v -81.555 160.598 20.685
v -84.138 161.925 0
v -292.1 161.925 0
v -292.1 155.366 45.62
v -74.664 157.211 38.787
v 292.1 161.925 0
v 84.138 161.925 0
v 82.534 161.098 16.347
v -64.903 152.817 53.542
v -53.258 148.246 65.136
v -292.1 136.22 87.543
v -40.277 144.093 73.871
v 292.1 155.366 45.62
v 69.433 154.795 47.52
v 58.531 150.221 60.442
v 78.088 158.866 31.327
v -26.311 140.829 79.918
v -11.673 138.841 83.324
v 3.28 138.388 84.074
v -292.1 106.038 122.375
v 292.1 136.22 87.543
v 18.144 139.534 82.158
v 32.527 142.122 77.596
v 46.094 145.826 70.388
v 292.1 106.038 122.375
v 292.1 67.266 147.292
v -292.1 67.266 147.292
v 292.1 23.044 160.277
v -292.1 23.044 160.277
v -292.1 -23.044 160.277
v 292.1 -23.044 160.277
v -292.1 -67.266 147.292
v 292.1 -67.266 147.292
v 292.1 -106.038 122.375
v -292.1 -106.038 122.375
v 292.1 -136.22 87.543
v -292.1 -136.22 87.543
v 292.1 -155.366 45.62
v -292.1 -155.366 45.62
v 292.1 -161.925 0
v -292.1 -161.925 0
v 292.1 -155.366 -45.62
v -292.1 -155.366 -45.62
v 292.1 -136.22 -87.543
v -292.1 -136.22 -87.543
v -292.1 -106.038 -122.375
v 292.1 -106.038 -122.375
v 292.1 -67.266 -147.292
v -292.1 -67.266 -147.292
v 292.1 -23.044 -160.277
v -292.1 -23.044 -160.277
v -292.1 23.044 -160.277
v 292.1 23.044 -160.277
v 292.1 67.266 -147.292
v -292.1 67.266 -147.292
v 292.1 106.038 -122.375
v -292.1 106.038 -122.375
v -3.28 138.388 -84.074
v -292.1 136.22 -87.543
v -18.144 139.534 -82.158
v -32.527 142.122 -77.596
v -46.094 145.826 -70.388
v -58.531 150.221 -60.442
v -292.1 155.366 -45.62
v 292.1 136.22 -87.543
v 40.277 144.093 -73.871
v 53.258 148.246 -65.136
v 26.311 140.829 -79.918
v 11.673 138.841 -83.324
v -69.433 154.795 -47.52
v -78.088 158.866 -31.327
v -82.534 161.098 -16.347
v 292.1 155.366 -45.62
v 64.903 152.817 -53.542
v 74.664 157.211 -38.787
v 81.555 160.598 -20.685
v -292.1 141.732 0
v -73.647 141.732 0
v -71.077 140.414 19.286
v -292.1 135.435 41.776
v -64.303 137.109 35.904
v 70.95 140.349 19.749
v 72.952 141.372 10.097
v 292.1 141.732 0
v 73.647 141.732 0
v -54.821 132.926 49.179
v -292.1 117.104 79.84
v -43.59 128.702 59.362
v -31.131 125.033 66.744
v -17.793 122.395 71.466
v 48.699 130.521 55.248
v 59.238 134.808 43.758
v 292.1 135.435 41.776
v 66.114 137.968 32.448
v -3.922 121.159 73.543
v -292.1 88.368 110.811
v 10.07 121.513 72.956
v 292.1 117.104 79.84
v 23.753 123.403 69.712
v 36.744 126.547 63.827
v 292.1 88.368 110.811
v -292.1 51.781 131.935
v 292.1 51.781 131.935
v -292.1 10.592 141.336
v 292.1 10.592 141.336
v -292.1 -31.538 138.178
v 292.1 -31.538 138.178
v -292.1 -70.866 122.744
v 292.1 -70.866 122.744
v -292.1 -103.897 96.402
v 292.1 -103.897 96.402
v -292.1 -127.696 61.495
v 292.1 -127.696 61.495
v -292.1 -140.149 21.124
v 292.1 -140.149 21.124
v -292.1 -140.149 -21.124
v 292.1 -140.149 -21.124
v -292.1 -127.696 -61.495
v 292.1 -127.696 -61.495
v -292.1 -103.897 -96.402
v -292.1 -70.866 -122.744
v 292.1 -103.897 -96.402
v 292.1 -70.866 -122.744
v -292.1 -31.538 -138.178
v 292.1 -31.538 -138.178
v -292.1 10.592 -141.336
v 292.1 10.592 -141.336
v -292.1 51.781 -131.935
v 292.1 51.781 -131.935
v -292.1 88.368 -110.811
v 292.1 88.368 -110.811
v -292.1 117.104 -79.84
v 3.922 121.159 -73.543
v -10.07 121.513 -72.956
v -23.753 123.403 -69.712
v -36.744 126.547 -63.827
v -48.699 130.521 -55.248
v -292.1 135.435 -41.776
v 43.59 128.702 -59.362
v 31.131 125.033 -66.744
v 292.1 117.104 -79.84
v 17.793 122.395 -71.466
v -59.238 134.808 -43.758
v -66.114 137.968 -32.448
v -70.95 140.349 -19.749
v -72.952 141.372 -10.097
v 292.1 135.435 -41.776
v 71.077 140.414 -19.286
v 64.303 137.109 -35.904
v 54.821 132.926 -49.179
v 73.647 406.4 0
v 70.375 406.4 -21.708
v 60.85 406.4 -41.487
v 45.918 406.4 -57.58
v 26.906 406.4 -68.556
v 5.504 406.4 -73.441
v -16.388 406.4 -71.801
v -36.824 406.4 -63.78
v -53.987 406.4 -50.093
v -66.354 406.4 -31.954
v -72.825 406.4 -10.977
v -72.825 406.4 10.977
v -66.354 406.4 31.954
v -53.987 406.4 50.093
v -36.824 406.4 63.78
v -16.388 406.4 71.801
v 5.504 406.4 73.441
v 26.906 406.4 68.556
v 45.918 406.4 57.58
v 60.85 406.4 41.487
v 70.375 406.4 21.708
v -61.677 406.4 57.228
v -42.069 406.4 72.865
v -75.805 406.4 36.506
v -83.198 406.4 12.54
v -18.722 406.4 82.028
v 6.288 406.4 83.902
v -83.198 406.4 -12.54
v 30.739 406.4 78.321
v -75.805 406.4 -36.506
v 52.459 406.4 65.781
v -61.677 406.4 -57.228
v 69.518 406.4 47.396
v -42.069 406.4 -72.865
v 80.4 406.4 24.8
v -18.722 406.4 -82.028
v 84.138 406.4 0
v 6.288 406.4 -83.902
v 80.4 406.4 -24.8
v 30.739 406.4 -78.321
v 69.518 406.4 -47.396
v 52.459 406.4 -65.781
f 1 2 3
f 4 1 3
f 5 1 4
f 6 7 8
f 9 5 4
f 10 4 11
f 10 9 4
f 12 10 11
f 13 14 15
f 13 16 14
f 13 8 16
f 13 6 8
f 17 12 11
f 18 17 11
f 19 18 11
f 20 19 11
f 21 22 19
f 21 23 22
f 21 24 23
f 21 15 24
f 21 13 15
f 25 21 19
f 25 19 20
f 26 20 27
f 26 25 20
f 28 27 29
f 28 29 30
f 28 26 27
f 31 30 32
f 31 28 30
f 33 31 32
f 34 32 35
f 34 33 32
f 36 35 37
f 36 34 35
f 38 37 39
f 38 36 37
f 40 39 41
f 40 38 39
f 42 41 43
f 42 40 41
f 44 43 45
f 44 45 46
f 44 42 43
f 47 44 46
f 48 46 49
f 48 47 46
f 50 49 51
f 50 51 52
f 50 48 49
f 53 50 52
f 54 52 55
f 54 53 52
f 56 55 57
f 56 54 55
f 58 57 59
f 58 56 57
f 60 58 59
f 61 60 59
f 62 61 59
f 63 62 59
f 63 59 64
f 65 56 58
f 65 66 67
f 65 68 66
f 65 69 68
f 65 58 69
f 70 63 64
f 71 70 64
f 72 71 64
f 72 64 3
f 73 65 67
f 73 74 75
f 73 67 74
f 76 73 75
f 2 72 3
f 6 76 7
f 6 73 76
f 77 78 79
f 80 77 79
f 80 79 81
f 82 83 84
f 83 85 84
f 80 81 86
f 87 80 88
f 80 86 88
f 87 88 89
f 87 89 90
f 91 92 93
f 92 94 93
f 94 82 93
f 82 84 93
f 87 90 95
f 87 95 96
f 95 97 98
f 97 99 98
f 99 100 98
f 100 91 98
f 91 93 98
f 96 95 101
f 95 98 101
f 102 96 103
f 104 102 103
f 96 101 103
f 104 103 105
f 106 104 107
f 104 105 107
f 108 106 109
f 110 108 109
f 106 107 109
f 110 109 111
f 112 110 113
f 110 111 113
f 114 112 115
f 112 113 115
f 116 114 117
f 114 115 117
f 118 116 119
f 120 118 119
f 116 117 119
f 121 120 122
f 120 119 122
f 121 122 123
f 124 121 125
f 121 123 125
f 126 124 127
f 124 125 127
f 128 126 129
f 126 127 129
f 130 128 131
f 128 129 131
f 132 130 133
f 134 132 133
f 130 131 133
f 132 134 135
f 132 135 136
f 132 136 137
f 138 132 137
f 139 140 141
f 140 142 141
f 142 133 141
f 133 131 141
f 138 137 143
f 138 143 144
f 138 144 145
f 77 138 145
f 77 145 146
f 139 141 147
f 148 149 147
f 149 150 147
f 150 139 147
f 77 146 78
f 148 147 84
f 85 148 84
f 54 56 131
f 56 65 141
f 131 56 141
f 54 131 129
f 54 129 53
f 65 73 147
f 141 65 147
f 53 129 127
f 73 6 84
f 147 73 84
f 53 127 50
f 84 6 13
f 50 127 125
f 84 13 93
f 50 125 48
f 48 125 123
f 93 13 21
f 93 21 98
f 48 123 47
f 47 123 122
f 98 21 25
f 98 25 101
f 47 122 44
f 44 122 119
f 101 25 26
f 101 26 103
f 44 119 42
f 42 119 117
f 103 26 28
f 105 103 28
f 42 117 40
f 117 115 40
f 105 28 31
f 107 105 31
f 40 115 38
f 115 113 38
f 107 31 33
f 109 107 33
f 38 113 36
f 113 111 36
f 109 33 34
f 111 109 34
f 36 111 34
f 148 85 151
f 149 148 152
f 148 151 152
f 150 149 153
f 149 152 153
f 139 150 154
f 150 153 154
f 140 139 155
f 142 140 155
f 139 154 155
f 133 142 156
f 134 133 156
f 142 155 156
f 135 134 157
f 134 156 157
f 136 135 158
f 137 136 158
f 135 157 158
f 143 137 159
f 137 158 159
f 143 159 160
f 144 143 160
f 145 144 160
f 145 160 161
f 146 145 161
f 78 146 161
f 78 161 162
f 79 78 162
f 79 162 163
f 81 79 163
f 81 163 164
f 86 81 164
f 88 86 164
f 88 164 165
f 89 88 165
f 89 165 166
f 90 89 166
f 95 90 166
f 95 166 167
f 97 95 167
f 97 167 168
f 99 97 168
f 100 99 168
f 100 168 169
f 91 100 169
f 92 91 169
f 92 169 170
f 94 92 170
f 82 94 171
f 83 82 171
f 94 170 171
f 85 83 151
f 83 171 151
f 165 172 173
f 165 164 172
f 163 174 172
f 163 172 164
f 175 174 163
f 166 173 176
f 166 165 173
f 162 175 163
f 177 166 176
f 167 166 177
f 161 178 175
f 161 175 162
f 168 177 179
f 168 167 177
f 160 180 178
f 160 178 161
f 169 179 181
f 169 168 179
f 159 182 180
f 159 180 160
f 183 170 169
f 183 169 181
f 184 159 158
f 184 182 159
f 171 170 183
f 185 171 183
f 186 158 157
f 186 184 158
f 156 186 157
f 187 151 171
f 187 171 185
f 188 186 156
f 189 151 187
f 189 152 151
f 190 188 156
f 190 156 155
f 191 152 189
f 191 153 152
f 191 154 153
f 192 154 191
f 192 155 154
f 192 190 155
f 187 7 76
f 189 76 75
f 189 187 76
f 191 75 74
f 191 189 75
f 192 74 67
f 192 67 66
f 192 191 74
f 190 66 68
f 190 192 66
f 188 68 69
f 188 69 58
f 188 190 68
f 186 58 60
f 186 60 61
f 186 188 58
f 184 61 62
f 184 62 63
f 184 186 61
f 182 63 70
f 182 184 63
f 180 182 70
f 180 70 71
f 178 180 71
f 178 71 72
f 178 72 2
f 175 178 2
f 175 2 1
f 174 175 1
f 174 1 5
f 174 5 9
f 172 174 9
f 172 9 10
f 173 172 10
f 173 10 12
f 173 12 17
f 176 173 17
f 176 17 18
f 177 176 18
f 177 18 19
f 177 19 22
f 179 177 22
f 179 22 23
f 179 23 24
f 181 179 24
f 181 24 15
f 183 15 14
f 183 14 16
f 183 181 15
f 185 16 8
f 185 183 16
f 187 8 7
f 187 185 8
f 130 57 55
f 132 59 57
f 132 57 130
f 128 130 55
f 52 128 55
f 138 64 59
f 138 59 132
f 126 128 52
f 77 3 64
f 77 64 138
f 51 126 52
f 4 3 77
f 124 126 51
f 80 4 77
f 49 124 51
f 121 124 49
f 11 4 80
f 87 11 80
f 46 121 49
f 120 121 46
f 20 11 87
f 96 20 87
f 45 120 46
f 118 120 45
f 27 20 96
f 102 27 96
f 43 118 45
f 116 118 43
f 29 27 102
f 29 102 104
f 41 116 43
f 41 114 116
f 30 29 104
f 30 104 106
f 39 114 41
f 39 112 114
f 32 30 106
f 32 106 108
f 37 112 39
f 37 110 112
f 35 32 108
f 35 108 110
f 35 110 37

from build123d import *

# Parameters (mm, degrees)
REVOLVE_OF_12_NOM_W           = 584.2
REVOLVE_OF_12_NOM_H           = 20.193
F_6_NOM_OD_EXTRUDE_REACH      = 661.193
F_6_NOM_OD_EXTRUDE_END_RADIUS = 161.925
SKETCH2_R                     = 84.1375
F_6_NOM_ID_EXTRUDE_CUT_REACH  = 661.193
F_6_NOM_ID_EXTRUDE_R          = 73.6473


with BuildPart() as part:
    # Revolve of 12 NOM → Revolve12 NOM (revolve)
    with BuildSketch(Plane.XY):
        with Locations((0, 151.8285)):
            Rectangle(REVOLVE_OF_12_NOM_W, REVOLVE_OF_12_NOM_H)
    revolve(axis=Axis((0, 0, 0), (1, 0, 0)))

    # 6 NOM OD Extrude: up to this cylinder (the profile starts outside it)
    f_6_nom_od_extrude_end = Plane(origin=(0, 0, 0), z_dir=(-1, 0, 0)) * Cylinder(F_6_NOM_OD_EXTRUDE_END_RADIUS, 1647.236, mode=Mode.PRIVATE)
    # Sketch2 → 6 NOM OD Extrude (add, up to the surface)
    with BuildSketch(Plane(origin=(0, 406.4, 0), x_dir=(1, 0, 0), z_dir=(0, 1, 0)), mode=Mode.PRIVATE) as f_6_nom_od_extrude_sk1:
        Circle(SKETCH2_R)
    f_6_nom_od_extrude_tool1 = extrude(f_6_nom_od_extrude_sk1.sketch, amount=-F_6_NOM_OD_EXTRUDE_REACH, mode=Mode.PRIVATE) - f_6_nom_od_extrude_end
    add(f_6_nom_od_extrude_tool1.solids().sort_by_distance((0, 406.4, 0))[0])

    # 6 NOM ID Extrude → 6 NOM ID Extrude Cut (cut, up to next)
    with BuildSketch(Plane(origin=(0, 406.4, 0), x_dir=(1, 0, 0), z_dir=(0, 1, 0)), mode=Mode.PRIVATE) as f_6_nom_id_extrude_cut_sk1:
        Circle(F_6_NOM_ID_EXTRUDE_R)
    f_6_nom_id_extrude_cut_tool1 = extrude(f_6_nom_id_extrude_cut_sk1.sketch, amount=-F_6_NOM_ID_EXTRUDE_CUT_REACH, mode=Mode.PRIVATE) & part.part
    add(f_6_nom_id_extrude_cut_tool1.solids().sort_by_distance((0, 406.4, 0))[0], mode=Mode.SUBTRACT)


solid = part.part
